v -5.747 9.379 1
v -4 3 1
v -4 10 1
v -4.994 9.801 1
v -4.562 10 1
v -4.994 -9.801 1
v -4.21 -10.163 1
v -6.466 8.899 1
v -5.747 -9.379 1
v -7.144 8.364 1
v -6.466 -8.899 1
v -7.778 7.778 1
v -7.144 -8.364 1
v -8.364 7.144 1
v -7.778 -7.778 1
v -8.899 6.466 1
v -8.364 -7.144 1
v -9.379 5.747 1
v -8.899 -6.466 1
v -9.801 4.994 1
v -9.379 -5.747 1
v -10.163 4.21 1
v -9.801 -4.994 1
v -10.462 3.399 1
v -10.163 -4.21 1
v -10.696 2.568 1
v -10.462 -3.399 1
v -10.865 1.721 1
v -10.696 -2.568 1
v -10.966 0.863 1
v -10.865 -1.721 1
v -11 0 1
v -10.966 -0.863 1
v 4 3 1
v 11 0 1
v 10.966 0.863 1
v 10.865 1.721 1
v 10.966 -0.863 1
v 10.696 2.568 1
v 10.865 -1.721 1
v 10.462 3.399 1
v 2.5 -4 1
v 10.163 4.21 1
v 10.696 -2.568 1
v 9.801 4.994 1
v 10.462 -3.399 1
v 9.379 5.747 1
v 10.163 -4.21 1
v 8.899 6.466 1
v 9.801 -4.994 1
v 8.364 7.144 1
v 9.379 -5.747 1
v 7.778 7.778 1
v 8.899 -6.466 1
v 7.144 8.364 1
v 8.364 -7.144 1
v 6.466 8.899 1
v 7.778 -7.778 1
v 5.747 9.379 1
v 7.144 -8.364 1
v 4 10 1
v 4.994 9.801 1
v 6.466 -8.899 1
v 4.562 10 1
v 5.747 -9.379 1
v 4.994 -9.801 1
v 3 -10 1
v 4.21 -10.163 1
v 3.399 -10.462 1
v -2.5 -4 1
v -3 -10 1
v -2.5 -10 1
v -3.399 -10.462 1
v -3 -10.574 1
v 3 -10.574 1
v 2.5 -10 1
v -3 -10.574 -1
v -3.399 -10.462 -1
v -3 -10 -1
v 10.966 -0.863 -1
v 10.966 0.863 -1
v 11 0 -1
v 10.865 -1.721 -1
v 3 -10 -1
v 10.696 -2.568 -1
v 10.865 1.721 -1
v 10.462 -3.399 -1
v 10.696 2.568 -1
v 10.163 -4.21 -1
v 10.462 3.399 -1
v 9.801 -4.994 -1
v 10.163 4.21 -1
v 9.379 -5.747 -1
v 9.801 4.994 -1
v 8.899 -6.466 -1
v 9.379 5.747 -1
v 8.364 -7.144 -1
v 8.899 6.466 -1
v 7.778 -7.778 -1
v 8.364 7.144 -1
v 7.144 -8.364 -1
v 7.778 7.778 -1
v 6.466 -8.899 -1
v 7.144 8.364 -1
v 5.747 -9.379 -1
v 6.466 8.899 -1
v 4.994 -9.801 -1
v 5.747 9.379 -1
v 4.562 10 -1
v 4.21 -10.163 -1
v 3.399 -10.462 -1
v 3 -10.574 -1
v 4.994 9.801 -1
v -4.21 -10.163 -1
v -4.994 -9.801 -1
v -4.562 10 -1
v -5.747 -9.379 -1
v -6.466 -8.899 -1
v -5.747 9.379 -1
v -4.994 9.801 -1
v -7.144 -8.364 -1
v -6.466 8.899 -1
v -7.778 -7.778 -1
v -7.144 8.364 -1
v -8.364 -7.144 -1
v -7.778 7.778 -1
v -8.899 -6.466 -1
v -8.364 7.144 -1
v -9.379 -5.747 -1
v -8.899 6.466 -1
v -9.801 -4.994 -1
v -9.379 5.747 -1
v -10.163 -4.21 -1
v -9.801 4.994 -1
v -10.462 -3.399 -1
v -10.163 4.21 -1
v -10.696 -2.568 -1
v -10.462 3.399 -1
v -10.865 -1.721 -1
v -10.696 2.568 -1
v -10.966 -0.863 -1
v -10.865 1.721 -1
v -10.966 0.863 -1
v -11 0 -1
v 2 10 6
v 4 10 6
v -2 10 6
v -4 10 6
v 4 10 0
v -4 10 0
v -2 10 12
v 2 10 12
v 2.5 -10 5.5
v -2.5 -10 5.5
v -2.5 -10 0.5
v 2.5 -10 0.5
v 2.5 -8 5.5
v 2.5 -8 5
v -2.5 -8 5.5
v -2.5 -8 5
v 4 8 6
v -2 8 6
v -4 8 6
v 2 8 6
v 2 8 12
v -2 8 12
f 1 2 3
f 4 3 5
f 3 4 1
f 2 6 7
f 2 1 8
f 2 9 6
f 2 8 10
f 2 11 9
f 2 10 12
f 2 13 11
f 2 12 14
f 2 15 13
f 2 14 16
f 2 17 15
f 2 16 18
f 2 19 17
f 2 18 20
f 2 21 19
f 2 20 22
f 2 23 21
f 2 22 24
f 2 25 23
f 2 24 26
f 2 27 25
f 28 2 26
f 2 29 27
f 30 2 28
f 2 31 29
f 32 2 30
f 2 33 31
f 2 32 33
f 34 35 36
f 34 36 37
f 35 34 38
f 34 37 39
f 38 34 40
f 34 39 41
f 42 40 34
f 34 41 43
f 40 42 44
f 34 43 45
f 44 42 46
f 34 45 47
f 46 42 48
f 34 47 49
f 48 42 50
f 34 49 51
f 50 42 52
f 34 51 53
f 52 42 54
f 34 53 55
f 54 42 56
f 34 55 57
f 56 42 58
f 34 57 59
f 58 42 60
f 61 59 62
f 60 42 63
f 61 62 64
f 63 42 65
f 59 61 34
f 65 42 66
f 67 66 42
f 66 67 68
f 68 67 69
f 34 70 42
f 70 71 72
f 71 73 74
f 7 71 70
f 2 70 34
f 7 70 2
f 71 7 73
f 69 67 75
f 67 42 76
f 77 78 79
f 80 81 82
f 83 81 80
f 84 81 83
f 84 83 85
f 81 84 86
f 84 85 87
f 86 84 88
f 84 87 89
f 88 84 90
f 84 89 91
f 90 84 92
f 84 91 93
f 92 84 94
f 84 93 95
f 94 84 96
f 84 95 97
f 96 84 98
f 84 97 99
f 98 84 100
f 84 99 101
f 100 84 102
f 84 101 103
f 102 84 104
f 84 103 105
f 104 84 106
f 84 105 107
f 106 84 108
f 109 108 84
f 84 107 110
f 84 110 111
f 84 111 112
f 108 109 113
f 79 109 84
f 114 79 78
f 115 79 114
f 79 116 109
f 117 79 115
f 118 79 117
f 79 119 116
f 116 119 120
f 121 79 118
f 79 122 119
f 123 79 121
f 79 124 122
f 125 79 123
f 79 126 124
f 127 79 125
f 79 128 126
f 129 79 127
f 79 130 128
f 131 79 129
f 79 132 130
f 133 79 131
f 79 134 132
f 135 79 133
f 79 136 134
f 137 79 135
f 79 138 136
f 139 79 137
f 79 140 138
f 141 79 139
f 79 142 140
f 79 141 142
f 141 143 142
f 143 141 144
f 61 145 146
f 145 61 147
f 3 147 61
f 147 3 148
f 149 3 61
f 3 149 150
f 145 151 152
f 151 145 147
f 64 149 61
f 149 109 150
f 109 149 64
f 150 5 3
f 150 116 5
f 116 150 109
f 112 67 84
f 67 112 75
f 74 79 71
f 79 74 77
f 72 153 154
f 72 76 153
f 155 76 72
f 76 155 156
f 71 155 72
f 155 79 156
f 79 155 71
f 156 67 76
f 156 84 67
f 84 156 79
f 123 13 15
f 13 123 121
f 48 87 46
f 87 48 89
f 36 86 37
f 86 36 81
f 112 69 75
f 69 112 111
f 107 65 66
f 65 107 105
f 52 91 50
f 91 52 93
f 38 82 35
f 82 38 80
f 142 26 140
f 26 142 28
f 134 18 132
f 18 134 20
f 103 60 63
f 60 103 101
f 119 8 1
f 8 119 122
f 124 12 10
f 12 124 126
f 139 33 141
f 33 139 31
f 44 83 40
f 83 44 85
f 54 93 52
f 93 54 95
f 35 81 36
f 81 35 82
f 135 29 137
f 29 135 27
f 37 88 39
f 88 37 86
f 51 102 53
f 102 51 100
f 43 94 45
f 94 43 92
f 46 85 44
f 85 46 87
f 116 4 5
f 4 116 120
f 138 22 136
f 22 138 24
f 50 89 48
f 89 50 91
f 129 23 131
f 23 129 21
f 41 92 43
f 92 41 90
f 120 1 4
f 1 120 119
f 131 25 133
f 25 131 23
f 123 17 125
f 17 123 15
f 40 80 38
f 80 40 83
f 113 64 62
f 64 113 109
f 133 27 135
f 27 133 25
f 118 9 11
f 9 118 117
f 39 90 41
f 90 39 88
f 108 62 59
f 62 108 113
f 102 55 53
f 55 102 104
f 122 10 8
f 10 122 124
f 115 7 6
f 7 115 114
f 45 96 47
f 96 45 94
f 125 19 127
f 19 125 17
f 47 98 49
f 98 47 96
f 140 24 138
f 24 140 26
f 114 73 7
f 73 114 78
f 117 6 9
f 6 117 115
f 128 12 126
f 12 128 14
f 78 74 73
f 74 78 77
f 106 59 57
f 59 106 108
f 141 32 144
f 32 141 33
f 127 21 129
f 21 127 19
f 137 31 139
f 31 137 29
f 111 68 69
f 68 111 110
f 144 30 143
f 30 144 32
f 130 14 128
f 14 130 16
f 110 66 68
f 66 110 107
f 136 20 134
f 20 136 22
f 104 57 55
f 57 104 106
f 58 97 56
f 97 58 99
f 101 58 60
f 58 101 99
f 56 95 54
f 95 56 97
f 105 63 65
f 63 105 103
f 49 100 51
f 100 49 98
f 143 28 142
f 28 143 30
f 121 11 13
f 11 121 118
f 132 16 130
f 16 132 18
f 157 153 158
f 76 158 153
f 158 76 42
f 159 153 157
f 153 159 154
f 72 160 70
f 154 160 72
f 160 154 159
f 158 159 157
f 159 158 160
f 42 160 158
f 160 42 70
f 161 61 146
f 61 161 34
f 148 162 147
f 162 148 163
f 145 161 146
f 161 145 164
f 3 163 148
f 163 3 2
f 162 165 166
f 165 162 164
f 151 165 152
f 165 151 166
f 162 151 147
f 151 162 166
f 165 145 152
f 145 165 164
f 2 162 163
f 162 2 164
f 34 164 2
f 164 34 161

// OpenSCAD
// krytka šroubu pod klikou na přednich dveřích Chrysler 300C

$fn=80;
module wedge(x,y,z){
    linear_extrude(z, center=true) polygon(points=[[0,0],[x,0],[x,y]]);
    
    }//module

module small_hook(){
    color("Green") cube([5,2,5],center=true);
    color("Green") translate([0,1,2]) rotate([0,+90,0]) wedge(5,5,5);
    }//module

module big_hook(){
    union(){
    color("Green") cube([8,2,6],center=true);
    color("Green") translate([-1,0,6]) cube([2,2,6],center=true);
    color("Green") translate([+1,0,6]) cube([2,2,6],center=true);
    color("Green") translate([0,-1,3]) rotate([0,+90,180]) wedge(7,7,8);    
        }//union
    }//module

module base(){
    
    difference(){
        color("Blue") cylinder(h=2, d=22, center=true);
        union(){
            color("Red")translate([0,11,0]) cube([10,2,2],center=true);
            color("Red")translate([0,-11,0]) cube([6,2,2],center=true);
            }//union
        }//difference
    }//module
    
module part(){
    translate([0,0,0]) base();
    translate([0,-9,3]) mirror([0,0,0]) small_hook();
    translate([0,+9,3]) mirror([0,0,0]) big_hook();
    
    }//module
    
    part();
    //wedge(5,5,5);
